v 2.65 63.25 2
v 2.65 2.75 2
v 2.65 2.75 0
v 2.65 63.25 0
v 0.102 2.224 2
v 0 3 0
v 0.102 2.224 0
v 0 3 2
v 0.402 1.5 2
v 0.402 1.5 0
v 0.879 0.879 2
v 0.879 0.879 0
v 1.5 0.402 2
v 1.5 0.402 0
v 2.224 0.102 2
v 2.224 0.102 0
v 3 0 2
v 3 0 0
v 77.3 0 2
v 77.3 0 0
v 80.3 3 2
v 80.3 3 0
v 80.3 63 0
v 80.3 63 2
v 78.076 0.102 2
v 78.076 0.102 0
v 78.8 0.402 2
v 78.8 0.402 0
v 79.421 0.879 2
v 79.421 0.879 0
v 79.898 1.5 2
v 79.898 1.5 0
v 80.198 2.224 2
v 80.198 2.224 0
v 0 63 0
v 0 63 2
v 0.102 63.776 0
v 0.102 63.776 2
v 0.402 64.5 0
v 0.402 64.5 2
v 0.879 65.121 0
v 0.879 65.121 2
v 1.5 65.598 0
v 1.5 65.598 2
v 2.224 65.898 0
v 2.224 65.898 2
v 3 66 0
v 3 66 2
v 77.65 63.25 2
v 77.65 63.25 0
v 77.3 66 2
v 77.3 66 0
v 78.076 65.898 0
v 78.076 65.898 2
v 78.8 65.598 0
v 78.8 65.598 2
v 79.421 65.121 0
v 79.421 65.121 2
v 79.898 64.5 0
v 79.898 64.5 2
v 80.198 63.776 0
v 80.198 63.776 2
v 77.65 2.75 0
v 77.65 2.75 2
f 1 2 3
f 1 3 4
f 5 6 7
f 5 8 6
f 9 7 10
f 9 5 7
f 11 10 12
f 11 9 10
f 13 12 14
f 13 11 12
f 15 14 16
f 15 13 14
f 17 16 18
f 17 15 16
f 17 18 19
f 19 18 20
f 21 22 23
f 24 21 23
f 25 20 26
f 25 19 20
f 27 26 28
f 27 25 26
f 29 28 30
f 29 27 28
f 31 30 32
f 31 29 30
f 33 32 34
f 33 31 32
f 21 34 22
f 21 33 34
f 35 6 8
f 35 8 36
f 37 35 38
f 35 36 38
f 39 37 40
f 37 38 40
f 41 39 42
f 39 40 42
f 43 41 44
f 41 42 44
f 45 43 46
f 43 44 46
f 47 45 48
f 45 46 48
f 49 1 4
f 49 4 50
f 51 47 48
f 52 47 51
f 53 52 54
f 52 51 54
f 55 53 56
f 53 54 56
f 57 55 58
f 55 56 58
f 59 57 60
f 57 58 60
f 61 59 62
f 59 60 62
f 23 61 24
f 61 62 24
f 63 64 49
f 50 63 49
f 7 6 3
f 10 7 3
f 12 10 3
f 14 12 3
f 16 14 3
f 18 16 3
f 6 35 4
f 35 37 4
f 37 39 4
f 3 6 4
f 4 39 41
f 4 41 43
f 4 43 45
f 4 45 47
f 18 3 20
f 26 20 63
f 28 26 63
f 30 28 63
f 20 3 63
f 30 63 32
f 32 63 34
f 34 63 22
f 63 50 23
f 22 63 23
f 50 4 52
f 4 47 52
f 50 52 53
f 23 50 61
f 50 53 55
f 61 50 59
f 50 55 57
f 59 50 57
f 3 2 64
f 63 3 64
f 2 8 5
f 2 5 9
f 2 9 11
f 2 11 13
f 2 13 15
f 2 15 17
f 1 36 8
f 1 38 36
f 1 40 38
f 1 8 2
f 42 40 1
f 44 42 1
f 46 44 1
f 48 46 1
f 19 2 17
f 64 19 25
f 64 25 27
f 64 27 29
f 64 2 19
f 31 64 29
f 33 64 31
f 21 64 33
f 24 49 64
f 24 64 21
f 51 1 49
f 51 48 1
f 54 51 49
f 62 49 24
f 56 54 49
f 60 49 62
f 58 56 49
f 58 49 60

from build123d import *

# Parameters (mm, degrees)
SKETCH1_W                  = 80.3
SKETCH1_H                  = 66
BOSS_EXTRUDE1_DEPTH        = 2
F_3_2_3_2_DIAMETER_HOLE1_D = 3.2
FILLET1_R                  = 3
SKETCH4_W                  = 75
SKETCH4_H                  = 60.5
CUT_EXTRUDE1_DEPTH         = 3


with BuildPart() as part:
    # Sketch1 → Boss-Extrude1 (new body)
    with BuildSketch(Plane.XY):
        with Locations((40.15, 33)):
            Rectangle(SKETCH1_W, SKETCH1_H)
    extrude(amount=BOSS_EXTRUDE1_DEPTH)

    # Ø3.2 (3.2) Diameter Hole1 (through all)
    with Locations(Plane.XY.offset(2)):
        with Locations((7, 59), (73.3, 59), (73.3, 7), (7, 7)):
            Hole(F_3_2_3_2_DIAMETER_HOLE1_D / 2)

    # Fillet1
    fillet1_edges = [part.edges().sort_by_distance(p)[0] for p in [
        (0, 66, 1),
        (80.3, 66, 1),
        (80.3, 0, 1),
        (0, 0, 1),
    ]]
    fillet(fillet1_edges, radius=FILLET1_R)

    # Sketch4 → Cut-Extrude1 (cut, through all)
    with BuildSketch(Plane.XY.offset(2)):
        with Locations((40.15, 33)):
            Rectangle(SKETCH4_W, SKETCH4_H)
    extrude(amount=-CUT_EXTRUDE1_DEPTH, mode=Mode.SUBTRACT)


solid = part.part
